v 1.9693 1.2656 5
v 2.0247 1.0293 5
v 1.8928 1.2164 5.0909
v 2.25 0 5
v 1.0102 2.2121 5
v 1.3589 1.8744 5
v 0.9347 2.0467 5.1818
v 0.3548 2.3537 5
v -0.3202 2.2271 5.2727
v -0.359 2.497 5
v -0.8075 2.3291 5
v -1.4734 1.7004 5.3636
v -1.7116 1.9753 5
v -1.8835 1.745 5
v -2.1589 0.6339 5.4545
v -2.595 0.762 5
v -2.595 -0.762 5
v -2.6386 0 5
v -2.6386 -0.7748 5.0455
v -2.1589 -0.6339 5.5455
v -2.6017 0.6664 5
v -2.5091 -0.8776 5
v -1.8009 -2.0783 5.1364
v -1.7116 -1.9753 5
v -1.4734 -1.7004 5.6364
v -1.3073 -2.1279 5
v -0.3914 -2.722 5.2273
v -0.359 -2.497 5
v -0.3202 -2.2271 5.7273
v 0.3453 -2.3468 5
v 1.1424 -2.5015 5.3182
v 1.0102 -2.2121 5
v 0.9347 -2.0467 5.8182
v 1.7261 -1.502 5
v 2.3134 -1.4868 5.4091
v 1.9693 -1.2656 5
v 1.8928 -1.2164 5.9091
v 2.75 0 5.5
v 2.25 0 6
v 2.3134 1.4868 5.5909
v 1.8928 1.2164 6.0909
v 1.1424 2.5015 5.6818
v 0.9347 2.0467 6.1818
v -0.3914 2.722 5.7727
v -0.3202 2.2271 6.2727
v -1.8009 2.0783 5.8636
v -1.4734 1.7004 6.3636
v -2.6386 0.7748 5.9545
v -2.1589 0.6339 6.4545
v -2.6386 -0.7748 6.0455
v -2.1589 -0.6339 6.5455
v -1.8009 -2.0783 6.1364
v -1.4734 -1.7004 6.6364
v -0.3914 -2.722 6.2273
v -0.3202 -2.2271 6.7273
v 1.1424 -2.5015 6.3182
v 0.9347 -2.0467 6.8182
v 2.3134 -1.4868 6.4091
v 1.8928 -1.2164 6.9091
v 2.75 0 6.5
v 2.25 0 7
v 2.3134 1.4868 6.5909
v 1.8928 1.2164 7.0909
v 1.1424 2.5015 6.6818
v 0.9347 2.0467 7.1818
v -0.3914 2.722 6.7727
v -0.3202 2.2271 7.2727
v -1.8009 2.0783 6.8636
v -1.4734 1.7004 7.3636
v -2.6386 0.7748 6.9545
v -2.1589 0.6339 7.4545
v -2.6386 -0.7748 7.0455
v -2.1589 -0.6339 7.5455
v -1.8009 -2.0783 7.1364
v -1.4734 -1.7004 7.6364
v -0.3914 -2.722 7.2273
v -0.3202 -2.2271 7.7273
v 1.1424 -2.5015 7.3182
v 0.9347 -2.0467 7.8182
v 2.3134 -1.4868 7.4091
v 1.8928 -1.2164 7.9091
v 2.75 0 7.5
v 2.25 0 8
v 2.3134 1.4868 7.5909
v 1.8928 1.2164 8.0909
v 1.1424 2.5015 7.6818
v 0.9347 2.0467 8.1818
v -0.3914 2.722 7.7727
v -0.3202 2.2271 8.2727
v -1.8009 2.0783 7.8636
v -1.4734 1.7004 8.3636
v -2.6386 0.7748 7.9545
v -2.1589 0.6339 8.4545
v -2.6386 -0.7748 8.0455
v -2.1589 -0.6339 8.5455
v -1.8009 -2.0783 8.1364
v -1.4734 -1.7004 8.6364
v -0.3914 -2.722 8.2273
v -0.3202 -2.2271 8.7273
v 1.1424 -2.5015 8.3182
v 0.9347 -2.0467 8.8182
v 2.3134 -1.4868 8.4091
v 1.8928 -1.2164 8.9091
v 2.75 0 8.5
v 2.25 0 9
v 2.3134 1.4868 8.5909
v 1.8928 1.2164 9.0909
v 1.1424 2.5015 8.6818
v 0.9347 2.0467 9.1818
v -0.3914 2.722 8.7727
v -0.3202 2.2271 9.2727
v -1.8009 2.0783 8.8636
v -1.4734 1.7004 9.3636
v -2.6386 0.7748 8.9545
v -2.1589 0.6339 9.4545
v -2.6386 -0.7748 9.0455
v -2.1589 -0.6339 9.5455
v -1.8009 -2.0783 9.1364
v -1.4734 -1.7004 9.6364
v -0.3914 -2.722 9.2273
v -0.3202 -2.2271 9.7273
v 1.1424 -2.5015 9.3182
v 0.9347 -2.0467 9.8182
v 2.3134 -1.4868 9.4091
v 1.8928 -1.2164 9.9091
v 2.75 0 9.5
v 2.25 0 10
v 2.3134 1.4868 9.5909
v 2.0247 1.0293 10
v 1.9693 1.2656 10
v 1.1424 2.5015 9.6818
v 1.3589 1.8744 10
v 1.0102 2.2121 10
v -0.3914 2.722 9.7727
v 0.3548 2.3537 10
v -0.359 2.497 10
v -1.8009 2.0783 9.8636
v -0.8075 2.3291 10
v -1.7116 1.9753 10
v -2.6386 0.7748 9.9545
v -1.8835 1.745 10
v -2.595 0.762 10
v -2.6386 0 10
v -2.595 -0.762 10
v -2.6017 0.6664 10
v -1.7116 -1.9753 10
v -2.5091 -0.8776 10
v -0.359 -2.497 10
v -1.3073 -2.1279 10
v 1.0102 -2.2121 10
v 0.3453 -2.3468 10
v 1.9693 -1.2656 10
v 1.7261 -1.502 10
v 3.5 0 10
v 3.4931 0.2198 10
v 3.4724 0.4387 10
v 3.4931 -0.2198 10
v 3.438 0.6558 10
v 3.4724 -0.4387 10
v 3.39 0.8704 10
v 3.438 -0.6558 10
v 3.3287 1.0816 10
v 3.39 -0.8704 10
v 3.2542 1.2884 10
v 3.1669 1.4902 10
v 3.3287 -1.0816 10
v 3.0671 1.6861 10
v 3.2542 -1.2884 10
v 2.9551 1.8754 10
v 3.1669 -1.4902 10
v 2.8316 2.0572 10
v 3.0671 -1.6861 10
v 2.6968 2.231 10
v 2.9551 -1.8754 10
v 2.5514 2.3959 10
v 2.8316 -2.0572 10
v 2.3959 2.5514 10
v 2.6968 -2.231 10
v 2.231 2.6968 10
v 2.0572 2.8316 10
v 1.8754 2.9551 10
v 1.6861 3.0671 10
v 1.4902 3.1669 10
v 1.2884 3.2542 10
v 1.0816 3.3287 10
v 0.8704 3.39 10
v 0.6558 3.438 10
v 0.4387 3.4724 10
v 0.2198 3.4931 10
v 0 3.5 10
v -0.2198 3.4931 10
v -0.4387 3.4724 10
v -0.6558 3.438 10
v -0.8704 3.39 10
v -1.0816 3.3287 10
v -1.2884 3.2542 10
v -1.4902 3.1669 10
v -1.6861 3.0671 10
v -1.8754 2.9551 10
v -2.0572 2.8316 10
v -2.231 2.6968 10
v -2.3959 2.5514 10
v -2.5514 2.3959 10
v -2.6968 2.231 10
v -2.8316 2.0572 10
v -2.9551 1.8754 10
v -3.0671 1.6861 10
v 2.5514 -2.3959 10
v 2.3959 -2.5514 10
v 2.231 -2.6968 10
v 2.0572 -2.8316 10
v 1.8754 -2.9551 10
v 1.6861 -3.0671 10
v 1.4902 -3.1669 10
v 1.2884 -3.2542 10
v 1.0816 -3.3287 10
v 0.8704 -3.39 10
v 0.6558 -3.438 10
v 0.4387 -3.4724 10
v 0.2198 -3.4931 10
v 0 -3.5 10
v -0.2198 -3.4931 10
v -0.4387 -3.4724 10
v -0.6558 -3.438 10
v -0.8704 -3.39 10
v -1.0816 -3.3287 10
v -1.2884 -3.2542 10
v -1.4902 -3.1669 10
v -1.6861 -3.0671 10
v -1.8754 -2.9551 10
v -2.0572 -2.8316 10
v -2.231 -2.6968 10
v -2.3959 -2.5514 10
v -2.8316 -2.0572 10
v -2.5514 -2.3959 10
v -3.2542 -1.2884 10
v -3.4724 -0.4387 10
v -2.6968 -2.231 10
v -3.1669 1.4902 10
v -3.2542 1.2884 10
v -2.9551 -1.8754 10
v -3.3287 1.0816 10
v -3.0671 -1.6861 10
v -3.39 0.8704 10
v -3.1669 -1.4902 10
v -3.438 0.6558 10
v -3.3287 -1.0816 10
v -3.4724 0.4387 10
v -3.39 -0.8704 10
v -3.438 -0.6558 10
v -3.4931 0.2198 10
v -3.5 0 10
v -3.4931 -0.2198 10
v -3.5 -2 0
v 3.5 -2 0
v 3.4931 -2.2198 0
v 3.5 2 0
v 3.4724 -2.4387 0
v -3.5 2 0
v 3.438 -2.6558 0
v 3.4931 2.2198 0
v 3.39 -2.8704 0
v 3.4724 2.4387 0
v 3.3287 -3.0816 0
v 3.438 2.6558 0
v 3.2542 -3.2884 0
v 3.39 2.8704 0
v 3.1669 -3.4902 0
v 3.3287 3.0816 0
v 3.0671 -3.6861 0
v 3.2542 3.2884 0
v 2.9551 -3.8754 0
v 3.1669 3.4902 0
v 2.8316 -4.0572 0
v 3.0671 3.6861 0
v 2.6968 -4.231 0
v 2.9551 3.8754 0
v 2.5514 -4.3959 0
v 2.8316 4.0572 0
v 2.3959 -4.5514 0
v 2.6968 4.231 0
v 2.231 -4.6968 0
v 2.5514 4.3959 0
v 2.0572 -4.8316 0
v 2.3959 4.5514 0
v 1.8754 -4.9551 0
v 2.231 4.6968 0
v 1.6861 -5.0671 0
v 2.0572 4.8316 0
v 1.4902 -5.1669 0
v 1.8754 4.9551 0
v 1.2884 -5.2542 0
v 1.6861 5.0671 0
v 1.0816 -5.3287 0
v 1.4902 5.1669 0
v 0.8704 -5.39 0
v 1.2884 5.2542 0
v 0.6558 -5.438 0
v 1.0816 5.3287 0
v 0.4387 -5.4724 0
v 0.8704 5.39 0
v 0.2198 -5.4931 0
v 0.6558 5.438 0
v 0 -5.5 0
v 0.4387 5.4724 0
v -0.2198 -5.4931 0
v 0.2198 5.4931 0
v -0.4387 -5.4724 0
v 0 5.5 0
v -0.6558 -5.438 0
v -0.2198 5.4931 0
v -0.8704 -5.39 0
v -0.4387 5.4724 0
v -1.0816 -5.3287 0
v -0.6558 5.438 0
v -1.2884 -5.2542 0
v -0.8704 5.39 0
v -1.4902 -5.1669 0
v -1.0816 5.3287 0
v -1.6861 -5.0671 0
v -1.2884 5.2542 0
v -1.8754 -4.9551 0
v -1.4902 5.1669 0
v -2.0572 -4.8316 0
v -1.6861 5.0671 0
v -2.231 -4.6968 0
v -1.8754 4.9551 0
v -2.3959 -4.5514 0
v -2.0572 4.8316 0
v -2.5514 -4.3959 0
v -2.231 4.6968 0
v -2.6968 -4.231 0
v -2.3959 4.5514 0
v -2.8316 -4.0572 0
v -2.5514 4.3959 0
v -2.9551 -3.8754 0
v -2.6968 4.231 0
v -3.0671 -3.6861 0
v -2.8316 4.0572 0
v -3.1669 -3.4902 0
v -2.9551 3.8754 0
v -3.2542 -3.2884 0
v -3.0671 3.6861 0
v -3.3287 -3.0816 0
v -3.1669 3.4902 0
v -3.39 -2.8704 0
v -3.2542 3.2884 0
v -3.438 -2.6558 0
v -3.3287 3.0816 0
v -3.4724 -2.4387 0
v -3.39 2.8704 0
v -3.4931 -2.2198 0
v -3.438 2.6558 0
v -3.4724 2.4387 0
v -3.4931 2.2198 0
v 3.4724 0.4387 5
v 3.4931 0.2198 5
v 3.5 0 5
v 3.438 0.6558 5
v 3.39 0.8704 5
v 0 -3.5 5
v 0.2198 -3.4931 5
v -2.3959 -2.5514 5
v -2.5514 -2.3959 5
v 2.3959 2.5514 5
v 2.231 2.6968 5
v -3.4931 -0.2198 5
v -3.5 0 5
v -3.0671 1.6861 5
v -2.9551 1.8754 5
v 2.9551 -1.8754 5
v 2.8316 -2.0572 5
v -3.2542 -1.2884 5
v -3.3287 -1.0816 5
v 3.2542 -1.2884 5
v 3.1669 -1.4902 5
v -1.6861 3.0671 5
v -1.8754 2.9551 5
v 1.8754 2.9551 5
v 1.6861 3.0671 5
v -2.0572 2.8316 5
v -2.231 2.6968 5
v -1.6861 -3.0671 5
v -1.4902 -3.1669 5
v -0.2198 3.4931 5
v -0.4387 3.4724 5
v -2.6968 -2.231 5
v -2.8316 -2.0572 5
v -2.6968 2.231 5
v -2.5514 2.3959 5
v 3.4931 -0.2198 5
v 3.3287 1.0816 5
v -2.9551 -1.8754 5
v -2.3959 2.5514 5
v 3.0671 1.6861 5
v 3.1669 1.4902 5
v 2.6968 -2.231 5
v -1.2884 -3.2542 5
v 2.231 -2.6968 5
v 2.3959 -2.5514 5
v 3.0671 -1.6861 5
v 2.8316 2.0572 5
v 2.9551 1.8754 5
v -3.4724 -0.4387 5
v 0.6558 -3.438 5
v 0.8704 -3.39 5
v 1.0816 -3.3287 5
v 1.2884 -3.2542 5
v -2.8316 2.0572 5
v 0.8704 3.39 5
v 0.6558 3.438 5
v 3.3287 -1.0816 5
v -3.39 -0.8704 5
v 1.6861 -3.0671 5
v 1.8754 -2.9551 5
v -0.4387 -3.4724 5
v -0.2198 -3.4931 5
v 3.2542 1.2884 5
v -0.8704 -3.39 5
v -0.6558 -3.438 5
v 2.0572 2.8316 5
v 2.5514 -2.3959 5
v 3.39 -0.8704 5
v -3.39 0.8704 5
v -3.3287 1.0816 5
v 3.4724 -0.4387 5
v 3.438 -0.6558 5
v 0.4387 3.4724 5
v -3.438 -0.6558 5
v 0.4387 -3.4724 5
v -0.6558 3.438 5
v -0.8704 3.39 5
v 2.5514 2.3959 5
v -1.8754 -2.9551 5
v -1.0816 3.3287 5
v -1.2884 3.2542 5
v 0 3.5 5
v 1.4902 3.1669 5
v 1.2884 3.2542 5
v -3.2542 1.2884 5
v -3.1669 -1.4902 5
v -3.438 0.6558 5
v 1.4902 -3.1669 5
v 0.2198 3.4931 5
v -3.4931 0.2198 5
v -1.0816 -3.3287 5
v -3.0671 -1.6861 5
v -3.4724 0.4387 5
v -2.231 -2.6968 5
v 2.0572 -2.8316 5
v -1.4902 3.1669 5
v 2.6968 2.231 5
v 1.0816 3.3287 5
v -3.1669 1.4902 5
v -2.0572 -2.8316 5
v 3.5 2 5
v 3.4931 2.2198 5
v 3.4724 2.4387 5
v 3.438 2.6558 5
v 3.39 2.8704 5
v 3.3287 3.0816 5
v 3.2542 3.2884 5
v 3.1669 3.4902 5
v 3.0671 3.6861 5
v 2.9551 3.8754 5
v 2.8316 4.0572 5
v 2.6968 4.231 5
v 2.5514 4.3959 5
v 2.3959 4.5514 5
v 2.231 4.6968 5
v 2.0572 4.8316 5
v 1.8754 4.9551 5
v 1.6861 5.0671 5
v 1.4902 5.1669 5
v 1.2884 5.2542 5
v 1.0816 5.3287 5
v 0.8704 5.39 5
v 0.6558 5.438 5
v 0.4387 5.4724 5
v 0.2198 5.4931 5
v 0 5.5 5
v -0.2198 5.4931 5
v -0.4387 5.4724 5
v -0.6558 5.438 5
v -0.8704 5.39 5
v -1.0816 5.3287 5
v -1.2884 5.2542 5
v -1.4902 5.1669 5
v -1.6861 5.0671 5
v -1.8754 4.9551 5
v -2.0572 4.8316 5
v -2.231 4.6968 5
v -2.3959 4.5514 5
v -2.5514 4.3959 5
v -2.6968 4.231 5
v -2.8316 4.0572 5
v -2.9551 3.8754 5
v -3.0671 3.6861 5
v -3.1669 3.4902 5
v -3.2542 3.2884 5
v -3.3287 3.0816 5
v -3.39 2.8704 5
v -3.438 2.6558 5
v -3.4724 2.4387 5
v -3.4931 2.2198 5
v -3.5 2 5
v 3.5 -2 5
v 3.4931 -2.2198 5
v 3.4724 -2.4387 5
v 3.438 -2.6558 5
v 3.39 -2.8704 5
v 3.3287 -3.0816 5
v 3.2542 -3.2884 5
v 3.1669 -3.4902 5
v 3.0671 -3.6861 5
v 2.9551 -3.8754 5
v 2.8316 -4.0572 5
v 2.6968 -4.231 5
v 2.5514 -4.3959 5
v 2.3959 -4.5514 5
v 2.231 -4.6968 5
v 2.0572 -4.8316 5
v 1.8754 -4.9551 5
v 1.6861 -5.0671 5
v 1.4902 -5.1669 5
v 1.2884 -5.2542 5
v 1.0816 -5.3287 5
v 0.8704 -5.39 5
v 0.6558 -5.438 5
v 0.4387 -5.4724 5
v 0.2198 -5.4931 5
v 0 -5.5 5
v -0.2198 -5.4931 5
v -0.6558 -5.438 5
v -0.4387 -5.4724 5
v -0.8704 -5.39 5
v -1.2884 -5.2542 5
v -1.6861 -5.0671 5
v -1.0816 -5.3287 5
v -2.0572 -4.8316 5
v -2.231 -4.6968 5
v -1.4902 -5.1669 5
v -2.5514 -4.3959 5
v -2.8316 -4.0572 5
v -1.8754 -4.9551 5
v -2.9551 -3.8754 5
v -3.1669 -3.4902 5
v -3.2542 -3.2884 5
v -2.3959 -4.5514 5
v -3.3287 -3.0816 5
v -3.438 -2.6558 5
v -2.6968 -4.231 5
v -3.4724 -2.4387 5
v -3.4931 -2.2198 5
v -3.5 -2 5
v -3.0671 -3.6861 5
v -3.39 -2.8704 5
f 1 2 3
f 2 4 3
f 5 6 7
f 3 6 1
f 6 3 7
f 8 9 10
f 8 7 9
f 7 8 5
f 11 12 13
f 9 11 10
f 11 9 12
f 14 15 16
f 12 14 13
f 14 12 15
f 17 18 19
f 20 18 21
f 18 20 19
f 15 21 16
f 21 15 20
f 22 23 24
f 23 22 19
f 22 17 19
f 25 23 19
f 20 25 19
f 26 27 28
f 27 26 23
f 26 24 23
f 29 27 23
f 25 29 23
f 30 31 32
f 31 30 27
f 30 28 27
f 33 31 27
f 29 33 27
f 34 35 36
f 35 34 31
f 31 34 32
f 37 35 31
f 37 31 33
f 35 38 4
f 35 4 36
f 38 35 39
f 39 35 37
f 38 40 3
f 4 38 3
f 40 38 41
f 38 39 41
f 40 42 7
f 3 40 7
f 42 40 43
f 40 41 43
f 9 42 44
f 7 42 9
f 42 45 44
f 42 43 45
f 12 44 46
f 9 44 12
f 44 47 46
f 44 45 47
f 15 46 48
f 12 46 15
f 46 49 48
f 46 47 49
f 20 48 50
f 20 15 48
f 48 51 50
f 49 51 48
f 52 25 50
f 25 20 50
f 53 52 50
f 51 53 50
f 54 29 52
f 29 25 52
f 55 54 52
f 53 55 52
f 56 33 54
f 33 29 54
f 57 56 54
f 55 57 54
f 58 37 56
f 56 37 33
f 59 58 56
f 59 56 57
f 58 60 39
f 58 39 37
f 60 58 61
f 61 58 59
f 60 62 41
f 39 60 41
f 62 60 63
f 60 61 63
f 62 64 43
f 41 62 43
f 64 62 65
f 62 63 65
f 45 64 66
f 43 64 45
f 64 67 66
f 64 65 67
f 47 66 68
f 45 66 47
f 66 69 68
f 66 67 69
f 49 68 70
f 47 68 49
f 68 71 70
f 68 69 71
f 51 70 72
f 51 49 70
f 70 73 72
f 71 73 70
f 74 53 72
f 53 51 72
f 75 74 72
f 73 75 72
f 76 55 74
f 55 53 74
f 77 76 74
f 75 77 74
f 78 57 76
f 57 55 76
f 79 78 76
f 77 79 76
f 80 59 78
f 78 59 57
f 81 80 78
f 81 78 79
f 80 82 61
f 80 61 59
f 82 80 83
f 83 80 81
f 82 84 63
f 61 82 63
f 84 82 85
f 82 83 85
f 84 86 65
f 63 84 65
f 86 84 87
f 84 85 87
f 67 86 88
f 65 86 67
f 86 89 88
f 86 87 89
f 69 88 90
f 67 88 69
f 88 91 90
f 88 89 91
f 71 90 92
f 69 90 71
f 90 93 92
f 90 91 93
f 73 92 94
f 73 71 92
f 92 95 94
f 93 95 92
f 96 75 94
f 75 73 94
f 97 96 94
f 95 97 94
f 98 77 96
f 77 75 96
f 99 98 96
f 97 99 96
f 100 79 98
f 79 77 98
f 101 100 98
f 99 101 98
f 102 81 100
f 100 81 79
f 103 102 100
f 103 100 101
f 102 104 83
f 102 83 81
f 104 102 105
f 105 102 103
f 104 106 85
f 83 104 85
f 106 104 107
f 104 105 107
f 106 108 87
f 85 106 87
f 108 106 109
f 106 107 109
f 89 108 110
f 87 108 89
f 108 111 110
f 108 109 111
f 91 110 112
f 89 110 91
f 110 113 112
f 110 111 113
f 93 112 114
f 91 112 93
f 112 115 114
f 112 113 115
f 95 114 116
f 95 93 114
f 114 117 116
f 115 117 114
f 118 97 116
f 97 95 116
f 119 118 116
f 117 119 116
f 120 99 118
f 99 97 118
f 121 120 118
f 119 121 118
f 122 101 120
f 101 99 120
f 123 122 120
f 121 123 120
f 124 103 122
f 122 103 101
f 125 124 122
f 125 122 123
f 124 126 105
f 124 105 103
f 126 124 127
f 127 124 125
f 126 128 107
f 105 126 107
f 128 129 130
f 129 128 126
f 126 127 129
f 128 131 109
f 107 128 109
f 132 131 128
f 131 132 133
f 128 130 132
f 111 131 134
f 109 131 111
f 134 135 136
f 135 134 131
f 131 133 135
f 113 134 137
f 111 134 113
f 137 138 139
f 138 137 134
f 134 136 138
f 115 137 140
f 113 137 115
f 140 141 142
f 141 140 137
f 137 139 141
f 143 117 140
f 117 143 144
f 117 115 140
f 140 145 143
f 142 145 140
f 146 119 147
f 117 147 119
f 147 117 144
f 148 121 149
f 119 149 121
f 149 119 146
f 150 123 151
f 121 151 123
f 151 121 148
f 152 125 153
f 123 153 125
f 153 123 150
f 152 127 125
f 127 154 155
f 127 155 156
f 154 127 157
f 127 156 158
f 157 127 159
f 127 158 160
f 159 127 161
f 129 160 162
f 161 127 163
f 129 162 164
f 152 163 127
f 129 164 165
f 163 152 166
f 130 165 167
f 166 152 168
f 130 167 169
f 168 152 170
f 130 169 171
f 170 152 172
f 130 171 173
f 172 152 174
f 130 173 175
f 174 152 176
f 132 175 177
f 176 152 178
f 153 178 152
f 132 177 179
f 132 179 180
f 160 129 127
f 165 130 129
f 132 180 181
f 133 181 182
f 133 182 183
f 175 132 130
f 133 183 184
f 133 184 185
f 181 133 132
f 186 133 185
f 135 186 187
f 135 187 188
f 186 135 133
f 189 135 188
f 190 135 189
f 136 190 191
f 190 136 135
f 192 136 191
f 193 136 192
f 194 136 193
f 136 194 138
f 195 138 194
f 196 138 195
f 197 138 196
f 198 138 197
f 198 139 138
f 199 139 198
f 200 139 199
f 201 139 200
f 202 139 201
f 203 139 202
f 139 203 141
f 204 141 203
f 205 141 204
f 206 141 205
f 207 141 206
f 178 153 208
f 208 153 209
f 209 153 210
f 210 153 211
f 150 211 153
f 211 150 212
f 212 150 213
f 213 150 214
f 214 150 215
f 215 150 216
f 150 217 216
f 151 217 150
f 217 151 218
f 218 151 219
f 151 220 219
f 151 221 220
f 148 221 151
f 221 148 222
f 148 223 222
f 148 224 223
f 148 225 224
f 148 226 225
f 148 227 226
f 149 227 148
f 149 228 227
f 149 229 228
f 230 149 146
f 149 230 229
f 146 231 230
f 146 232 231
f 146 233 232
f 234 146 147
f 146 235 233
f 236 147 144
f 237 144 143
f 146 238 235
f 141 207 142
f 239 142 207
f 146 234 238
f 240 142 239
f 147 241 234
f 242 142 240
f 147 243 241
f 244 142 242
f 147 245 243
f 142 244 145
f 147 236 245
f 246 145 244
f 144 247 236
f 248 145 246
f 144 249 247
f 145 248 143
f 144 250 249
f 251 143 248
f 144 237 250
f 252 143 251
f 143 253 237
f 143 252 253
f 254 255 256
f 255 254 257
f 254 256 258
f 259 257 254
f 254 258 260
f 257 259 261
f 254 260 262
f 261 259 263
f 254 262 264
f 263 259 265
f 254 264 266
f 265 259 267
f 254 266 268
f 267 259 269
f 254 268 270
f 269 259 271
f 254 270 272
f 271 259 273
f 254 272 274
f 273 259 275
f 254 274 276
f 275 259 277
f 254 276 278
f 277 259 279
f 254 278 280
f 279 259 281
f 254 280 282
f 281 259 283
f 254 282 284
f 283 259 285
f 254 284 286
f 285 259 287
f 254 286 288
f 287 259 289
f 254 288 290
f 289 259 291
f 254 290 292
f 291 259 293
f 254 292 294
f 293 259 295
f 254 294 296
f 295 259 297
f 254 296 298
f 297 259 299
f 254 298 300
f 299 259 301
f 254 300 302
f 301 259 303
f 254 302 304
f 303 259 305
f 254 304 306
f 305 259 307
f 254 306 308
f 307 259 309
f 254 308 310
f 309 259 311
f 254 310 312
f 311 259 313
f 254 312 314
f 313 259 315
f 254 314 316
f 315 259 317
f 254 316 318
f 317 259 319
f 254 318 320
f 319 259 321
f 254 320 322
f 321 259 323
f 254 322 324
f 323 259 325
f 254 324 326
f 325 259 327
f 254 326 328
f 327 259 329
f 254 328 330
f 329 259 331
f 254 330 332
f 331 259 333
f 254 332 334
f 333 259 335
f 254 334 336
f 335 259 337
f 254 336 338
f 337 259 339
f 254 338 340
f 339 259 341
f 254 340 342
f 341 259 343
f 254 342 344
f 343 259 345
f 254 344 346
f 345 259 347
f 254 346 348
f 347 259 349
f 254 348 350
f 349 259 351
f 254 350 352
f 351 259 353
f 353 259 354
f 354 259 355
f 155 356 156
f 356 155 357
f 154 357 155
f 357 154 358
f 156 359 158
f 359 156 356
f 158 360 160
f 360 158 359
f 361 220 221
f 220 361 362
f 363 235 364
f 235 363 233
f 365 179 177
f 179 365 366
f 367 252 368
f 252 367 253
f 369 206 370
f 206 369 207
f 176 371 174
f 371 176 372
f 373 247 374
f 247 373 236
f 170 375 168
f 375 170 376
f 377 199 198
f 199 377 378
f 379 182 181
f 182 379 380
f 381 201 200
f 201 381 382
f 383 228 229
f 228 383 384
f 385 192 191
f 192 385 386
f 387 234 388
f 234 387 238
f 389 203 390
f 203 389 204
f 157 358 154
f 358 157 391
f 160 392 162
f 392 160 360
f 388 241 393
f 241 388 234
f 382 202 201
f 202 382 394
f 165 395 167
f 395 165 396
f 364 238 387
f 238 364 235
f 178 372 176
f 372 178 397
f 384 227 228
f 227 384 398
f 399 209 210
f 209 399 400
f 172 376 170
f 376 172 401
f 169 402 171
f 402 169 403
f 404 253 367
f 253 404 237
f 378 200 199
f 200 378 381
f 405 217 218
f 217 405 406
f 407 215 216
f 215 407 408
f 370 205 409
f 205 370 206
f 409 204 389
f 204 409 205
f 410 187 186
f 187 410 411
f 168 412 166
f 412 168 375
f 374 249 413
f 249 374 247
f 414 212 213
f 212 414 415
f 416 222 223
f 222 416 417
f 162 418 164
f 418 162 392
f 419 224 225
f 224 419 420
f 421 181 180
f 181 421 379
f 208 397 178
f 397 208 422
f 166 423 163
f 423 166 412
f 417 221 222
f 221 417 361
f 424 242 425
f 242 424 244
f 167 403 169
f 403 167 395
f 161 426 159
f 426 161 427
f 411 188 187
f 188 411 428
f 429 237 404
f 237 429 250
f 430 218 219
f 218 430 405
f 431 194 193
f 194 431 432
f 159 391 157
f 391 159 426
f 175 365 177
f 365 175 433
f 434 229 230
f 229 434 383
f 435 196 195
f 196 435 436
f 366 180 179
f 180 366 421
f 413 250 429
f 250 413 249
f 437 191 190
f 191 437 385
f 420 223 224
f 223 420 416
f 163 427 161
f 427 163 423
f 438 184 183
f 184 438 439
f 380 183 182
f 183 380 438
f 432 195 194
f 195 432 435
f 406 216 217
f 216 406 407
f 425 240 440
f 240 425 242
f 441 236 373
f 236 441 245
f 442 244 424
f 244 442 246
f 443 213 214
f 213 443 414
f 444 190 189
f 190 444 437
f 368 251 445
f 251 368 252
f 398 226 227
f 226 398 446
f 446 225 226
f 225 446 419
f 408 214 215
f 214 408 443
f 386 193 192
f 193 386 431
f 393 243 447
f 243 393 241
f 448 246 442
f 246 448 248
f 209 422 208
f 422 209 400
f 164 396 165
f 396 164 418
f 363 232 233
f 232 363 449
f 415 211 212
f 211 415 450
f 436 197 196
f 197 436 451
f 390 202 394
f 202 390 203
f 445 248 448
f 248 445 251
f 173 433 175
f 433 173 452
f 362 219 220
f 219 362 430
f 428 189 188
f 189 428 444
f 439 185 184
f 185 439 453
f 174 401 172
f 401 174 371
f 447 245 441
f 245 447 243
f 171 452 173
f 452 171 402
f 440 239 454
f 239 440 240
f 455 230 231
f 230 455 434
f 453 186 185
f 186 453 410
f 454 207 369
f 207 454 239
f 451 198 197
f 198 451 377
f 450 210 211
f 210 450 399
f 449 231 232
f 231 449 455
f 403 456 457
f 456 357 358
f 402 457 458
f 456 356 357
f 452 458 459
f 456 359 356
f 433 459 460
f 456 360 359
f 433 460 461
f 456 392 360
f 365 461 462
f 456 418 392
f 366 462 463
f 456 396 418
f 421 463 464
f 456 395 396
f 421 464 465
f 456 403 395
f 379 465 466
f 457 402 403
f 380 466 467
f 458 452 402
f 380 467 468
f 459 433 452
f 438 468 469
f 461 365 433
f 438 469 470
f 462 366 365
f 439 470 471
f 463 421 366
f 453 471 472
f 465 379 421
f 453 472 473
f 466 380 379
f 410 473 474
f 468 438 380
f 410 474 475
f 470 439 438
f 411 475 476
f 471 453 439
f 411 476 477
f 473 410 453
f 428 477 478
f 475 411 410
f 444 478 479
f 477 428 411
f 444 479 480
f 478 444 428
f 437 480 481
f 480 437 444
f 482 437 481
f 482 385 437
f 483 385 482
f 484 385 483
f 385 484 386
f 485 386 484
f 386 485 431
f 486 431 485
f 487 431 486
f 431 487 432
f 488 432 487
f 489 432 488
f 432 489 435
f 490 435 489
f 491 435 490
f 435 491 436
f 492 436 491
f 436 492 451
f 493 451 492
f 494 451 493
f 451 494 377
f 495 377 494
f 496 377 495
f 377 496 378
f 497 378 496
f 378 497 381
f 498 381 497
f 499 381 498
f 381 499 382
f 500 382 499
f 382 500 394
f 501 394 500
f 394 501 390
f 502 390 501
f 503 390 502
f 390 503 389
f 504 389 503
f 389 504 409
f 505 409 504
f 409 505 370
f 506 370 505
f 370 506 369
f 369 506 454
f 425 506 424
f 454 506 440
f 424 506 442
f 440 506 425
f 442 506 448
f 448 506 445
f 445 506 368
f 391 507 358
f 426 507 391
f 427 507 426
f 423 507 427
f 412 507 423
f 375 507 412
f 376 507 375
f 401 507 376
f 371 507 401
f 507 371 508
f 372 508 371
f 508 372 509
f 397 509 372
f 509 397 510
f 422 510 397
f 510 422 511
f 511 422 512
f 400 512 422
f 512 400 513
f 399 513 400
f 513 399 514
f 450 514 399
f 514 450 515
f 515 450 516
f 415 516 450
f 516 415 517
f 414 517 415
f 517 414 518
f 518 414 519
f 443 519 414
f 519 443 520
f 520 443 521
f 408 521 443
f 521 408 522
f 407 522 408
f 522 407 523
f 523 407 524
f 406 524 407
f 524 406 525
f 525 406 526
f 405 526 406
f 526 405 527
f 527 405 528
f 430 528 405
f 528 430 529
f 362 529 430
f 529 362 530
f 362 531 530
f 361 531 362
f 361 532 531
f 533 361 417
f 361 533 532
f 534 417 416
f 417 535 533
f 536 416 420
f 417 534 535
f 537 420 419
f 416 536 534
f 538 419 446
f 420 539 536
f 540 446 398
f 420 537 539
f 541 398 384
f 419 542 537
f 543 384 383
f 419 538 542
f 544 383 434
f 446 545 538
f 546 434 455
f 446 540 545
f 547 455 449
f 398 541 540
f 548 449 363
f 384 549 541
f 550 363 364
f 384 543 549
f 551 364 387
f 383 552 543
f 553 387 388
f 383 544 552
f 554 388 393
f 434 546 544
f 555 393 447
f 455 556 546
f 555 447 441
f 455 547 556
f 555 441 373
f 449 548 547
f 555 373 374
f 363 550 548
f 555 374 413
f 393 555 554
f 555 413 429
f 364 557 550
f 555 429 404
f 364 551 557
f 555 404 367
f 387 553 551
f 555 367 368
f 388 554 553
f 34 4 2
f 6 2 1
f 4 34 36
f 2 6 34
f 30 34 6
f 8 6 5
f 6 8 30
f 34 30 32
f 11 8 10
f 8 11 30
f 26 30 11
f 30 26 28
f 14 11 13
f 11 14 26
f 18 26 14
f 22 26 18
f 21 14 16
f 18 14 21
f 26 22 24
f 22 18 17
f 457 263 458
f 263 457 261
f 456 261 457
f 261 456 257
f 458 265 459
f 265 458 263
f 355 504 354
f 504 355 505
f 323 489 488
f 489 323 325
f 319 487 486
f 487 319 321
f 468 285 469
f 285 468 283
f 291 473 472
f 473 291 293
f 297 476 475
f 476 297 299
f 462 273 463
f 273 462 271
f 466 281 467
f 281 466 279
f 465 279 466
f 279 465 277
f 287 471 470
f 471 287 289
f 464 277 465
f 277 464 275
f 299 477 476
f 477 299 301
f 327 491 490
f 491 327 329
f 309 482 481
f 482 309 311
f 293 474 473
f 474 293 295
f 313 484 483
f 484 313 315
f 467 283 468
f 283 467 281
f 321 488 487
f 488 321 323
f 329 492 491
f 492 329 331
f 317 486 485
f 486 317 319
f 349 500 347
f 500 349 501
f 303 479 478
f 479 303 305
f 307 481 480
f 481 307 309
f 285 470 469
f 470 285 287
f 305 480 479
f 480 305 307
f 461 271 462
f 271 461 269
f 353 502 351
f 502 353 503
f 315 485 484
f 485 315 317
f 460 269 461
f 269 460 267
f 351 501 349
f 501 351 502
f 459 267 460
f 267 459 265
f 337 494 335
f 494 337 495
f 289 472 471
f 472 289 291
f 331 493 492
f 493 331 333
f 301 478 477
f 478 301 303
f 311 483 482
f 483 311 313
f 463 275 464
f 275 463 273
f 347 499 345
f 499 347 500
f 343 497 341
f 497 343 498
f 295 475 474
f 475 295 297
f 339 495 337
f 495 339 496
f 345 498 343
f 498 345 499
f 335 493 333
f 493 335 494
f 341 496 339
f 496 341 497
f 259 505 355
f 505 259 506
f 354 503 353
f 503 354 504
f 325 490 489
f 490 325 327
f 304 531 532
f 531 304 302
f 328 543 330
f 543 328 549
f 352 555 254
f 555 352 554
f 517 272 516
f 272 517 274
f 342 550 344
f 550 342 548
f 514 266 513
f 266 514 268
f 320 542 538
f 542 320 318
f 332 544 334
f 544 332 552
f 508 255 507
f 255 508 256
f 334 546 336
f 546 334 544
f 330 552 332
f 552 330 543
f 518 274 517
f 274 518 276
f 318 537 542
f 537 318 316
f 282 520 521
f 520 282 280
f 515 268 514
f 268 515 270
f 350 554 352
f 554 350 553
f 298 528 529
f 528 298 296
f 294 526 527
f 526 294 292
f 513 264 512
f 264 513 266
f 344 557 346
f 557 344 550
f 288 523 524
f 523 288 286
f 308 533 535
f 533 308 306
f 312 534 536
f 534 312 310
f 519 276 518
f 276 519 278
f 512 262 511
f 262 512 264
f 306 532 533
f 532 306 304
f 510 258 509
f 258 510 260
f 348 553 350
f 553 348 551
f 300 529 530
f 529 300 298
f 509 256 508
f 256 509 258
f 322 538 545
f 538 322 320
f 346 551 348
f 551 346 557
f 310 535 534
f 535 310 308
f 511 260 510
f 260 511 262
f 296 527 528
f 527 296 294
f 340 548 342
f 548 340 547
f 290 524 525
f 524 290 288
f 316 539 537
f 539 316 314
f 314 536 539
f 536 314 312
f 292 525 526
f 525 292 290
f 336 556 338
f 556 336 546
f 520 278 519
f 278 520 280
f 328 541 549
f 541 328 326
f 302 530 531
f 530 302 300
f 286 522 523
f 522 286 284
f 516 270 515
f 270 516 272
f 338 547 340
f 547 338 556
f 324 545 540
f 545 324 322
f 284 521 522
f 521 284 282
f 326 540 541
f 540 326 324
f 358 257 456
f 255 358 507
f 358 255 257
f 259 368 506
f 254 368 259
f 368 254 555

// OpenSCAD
// file: polyScrewThread.scad
/*
 *    polyScrewThread.scad    by aubenc @ Thingiverse
 *
 * This script contains the library modules that can be used to generate
 * threaded rods, screws and nuts.
 *
 * http://www.thingiverse.com/thing:8796
 *
 * CC Public Domain
 */

module screw_thread(od,st,lf0,lt,rs,cs)
{
    or=od/2;
    ir=or-st/2*cos(lf0)/sin(lf0);
    pf=2*PI*or;
    sn=floor(pf/rs);
    lfxy=360/sn;
    ttn=round(lt/st)+1;
    zt=st/sn;

    intersection()
    {
        if (cs >= -1)
        {
           # thread_shape(cs,lt,or,ir,sn,st);
        }

        full_thread(ttn,st,sn,zt,lfxy,or,ir);
    }
}

module hex_nut(df,hg,sth,clf,cod,crs)
{

    difference()
    {
        hex_head(hg,df);

        hex_countersink_ends(sth/2,cod,clf,crs,hg);

        screw_thread(cod,sth,clf,hg,crs,-2);
    }
}

module hex_screw(od,st,lf0,lt,rs,cs,df,hg,ntl,ntd)
{
    ntr=od/2-(st/2+0.1)*cos(lf0)/sin(lf0);

    union()
    {
        hex_head(hg,df);

        translate([0,0,hg])
        if ( ntl == 0 )
        {
            cylinder(h=0.01, r=ntr, center=true);
        }
        else
        {
            if ( ntd == -1 )
            {
                cylinder(h=ntl+0.01, r=ntr, $fn=floor(od*PI/rs), center=false);
            }
            else if ( ntd == 0 )
            {
                union()
                {
                    cylinder(h=ntl-st/2,
                             r=od/2, $fn=floor(od*PI/rs), center=false);

                    translate([0,0,ntl-st/2])
                    cylinder(h=st/2,
                             r1=od/2, r2=ntr, 
                             $fn=floor(od*PI/rs), center=false);
                }
            }
            else
            {
                cylinder(h=ntl, r=ntd/2, $fn=ntd*PI/rs, center=false);
            }
        }

        translate([0,0,ntl+hg]) screw_thread(od,st,lf0,lt,rs,cs);
    }
}

module thread_shape(cs,lt,or,ir,sn,st)
{
    if ( cs == 0 )
    {
        cylinder(h=lt, r=or, $fn=sn, center=false);
    }
    else
    {
        union()
        {
            translate([0,0,st/2])
              cylinder(h=lt-st+0.005, r=or, $fn=sn, center=false);

            if ( cs == -1 || cs == 2 )
            {
                cylinder(h=st/2, r1=ir, r2=or, $fn=sn, center=false);
            }
            else
            {
                cylinder(h=st/2, r=or, $fn=sn, center=false);
            }

            translate([0,0,lt-st/2])
            if ( cs == 1 || cs == 2 )
            {
                  cylinder(h=st/2, r1=or, r2=ir, $fn=sn, center=false);
            }
            else
            {
                cylinder(h=st/2, r=or, $fn=sn, center=false);
            }
        }
    }
}

module full_thread(ttn,st,sn,zt,lfxy,or,ir)
{
    for(i=[0:ttn-1])
    {
        for(j=[0:sn-1])
        {
            polyhedron(
                  points=[
                          [0,                  0,                  i*st-st            ],
                          [ir*cos((j+1)*lfxy), ir*sin((j+1)*lfxy), i*st+(j+1)*zt-st   ],
                          [ir*cos(j*lfxy),     ir*sin(j*lfxy),     i*st+j*zt-st       ],
                          [or*cos((j+1)*lfxy), or*sin((j+1)*lfxy), i*st+(j+1)*zt-st/2 ],
                          [or*cos(j*lfxy),     or*sin(j*lfxy),     i*st+j*zt-st/2     ],
                          [0,                  0,                  i*st+st            ],
                          [ir*cos((j+1)*lfxy), ir*sin((j+1)*lfxy), i*st+(j+1)*zt      ],
                          [ir*cos(j*lfxy),     ir*sin(j*lfxy),     i*st+j*zt          ]
                         ],
               triangles=[
                          [0,1,2],
                          [5,6,3],[5,3,0],[0,3,1],
                          [3,4,1],[1,4,2],
                          [3,6,4],[4,6,7],
                          [0,2,4],[0,4,5],[5,4,7],
                          [5,7,6]
                         ],
               convexity=5);
        }
    }
}

module hex_head(hg,df)
{
    cylinder(h=hg, r=df/2/sin(60), $fn=6, center=false);
}

module hex_countersink_ends(chg,cod,clf,crs,hg)
{
    translate([0,0,-0.1])
    cylinder(h=chg+0.01, 
             r1=cod/2, 
             r2=cod/2-(chg+0.1)*cos(clf)/sin(clf),
             $fn=floor(cod*PI/crs), center=false);

    translate([0,0,hg-chg+0.1])
    cylinder(h=chg+0.01, 
             r1=cod/2-(chg+0.1)*cos(clf)/sin(clf),
             r2=cod/2, 
             $fn=floor(cod*PI/crs), center=false);
}
// main file
//All mesurements are in mm
include <polyScrewThread.scad>
PI=3.141592;

$fn=100;
flat_height=5;
flat_width=5.5;
flat_lenght=37;
flat_tapper_height=2;
flat_tapper_offset_mag_side=flat_height;
flat_tapper_offset_trigger_side=14;
flat_tapper_offset_trigger_side_lenght=9;
thread_height=10;

bolt_lenght=30;
bolt_diam=5;
bolt_offset=5;

bolt_hole_diam=7;
bolt_hole_height=11;



bh_offset=(bolt_hole_height-bolt_hole_diam)/2; //Dont Set

difference(){
cylinder(r=bolt_hole_diam/2,h=10);
screw_thread(bolt_diam+0.5,   1,   45,    thread_height,    PI/2,    0);
}
translate([0,bh_offset,0])cylinder(r=bolt_hole_diam/2,h=5);
translate([0,-bh_offset,0])cylinder(r=bolt_hole_diam/2,h=5);
translate([-bolt_hole_diam/2,-bh_offset,0])cube([bolt_hole_diam,(bolt_hole_height-bolt_hole_diam),5]);
